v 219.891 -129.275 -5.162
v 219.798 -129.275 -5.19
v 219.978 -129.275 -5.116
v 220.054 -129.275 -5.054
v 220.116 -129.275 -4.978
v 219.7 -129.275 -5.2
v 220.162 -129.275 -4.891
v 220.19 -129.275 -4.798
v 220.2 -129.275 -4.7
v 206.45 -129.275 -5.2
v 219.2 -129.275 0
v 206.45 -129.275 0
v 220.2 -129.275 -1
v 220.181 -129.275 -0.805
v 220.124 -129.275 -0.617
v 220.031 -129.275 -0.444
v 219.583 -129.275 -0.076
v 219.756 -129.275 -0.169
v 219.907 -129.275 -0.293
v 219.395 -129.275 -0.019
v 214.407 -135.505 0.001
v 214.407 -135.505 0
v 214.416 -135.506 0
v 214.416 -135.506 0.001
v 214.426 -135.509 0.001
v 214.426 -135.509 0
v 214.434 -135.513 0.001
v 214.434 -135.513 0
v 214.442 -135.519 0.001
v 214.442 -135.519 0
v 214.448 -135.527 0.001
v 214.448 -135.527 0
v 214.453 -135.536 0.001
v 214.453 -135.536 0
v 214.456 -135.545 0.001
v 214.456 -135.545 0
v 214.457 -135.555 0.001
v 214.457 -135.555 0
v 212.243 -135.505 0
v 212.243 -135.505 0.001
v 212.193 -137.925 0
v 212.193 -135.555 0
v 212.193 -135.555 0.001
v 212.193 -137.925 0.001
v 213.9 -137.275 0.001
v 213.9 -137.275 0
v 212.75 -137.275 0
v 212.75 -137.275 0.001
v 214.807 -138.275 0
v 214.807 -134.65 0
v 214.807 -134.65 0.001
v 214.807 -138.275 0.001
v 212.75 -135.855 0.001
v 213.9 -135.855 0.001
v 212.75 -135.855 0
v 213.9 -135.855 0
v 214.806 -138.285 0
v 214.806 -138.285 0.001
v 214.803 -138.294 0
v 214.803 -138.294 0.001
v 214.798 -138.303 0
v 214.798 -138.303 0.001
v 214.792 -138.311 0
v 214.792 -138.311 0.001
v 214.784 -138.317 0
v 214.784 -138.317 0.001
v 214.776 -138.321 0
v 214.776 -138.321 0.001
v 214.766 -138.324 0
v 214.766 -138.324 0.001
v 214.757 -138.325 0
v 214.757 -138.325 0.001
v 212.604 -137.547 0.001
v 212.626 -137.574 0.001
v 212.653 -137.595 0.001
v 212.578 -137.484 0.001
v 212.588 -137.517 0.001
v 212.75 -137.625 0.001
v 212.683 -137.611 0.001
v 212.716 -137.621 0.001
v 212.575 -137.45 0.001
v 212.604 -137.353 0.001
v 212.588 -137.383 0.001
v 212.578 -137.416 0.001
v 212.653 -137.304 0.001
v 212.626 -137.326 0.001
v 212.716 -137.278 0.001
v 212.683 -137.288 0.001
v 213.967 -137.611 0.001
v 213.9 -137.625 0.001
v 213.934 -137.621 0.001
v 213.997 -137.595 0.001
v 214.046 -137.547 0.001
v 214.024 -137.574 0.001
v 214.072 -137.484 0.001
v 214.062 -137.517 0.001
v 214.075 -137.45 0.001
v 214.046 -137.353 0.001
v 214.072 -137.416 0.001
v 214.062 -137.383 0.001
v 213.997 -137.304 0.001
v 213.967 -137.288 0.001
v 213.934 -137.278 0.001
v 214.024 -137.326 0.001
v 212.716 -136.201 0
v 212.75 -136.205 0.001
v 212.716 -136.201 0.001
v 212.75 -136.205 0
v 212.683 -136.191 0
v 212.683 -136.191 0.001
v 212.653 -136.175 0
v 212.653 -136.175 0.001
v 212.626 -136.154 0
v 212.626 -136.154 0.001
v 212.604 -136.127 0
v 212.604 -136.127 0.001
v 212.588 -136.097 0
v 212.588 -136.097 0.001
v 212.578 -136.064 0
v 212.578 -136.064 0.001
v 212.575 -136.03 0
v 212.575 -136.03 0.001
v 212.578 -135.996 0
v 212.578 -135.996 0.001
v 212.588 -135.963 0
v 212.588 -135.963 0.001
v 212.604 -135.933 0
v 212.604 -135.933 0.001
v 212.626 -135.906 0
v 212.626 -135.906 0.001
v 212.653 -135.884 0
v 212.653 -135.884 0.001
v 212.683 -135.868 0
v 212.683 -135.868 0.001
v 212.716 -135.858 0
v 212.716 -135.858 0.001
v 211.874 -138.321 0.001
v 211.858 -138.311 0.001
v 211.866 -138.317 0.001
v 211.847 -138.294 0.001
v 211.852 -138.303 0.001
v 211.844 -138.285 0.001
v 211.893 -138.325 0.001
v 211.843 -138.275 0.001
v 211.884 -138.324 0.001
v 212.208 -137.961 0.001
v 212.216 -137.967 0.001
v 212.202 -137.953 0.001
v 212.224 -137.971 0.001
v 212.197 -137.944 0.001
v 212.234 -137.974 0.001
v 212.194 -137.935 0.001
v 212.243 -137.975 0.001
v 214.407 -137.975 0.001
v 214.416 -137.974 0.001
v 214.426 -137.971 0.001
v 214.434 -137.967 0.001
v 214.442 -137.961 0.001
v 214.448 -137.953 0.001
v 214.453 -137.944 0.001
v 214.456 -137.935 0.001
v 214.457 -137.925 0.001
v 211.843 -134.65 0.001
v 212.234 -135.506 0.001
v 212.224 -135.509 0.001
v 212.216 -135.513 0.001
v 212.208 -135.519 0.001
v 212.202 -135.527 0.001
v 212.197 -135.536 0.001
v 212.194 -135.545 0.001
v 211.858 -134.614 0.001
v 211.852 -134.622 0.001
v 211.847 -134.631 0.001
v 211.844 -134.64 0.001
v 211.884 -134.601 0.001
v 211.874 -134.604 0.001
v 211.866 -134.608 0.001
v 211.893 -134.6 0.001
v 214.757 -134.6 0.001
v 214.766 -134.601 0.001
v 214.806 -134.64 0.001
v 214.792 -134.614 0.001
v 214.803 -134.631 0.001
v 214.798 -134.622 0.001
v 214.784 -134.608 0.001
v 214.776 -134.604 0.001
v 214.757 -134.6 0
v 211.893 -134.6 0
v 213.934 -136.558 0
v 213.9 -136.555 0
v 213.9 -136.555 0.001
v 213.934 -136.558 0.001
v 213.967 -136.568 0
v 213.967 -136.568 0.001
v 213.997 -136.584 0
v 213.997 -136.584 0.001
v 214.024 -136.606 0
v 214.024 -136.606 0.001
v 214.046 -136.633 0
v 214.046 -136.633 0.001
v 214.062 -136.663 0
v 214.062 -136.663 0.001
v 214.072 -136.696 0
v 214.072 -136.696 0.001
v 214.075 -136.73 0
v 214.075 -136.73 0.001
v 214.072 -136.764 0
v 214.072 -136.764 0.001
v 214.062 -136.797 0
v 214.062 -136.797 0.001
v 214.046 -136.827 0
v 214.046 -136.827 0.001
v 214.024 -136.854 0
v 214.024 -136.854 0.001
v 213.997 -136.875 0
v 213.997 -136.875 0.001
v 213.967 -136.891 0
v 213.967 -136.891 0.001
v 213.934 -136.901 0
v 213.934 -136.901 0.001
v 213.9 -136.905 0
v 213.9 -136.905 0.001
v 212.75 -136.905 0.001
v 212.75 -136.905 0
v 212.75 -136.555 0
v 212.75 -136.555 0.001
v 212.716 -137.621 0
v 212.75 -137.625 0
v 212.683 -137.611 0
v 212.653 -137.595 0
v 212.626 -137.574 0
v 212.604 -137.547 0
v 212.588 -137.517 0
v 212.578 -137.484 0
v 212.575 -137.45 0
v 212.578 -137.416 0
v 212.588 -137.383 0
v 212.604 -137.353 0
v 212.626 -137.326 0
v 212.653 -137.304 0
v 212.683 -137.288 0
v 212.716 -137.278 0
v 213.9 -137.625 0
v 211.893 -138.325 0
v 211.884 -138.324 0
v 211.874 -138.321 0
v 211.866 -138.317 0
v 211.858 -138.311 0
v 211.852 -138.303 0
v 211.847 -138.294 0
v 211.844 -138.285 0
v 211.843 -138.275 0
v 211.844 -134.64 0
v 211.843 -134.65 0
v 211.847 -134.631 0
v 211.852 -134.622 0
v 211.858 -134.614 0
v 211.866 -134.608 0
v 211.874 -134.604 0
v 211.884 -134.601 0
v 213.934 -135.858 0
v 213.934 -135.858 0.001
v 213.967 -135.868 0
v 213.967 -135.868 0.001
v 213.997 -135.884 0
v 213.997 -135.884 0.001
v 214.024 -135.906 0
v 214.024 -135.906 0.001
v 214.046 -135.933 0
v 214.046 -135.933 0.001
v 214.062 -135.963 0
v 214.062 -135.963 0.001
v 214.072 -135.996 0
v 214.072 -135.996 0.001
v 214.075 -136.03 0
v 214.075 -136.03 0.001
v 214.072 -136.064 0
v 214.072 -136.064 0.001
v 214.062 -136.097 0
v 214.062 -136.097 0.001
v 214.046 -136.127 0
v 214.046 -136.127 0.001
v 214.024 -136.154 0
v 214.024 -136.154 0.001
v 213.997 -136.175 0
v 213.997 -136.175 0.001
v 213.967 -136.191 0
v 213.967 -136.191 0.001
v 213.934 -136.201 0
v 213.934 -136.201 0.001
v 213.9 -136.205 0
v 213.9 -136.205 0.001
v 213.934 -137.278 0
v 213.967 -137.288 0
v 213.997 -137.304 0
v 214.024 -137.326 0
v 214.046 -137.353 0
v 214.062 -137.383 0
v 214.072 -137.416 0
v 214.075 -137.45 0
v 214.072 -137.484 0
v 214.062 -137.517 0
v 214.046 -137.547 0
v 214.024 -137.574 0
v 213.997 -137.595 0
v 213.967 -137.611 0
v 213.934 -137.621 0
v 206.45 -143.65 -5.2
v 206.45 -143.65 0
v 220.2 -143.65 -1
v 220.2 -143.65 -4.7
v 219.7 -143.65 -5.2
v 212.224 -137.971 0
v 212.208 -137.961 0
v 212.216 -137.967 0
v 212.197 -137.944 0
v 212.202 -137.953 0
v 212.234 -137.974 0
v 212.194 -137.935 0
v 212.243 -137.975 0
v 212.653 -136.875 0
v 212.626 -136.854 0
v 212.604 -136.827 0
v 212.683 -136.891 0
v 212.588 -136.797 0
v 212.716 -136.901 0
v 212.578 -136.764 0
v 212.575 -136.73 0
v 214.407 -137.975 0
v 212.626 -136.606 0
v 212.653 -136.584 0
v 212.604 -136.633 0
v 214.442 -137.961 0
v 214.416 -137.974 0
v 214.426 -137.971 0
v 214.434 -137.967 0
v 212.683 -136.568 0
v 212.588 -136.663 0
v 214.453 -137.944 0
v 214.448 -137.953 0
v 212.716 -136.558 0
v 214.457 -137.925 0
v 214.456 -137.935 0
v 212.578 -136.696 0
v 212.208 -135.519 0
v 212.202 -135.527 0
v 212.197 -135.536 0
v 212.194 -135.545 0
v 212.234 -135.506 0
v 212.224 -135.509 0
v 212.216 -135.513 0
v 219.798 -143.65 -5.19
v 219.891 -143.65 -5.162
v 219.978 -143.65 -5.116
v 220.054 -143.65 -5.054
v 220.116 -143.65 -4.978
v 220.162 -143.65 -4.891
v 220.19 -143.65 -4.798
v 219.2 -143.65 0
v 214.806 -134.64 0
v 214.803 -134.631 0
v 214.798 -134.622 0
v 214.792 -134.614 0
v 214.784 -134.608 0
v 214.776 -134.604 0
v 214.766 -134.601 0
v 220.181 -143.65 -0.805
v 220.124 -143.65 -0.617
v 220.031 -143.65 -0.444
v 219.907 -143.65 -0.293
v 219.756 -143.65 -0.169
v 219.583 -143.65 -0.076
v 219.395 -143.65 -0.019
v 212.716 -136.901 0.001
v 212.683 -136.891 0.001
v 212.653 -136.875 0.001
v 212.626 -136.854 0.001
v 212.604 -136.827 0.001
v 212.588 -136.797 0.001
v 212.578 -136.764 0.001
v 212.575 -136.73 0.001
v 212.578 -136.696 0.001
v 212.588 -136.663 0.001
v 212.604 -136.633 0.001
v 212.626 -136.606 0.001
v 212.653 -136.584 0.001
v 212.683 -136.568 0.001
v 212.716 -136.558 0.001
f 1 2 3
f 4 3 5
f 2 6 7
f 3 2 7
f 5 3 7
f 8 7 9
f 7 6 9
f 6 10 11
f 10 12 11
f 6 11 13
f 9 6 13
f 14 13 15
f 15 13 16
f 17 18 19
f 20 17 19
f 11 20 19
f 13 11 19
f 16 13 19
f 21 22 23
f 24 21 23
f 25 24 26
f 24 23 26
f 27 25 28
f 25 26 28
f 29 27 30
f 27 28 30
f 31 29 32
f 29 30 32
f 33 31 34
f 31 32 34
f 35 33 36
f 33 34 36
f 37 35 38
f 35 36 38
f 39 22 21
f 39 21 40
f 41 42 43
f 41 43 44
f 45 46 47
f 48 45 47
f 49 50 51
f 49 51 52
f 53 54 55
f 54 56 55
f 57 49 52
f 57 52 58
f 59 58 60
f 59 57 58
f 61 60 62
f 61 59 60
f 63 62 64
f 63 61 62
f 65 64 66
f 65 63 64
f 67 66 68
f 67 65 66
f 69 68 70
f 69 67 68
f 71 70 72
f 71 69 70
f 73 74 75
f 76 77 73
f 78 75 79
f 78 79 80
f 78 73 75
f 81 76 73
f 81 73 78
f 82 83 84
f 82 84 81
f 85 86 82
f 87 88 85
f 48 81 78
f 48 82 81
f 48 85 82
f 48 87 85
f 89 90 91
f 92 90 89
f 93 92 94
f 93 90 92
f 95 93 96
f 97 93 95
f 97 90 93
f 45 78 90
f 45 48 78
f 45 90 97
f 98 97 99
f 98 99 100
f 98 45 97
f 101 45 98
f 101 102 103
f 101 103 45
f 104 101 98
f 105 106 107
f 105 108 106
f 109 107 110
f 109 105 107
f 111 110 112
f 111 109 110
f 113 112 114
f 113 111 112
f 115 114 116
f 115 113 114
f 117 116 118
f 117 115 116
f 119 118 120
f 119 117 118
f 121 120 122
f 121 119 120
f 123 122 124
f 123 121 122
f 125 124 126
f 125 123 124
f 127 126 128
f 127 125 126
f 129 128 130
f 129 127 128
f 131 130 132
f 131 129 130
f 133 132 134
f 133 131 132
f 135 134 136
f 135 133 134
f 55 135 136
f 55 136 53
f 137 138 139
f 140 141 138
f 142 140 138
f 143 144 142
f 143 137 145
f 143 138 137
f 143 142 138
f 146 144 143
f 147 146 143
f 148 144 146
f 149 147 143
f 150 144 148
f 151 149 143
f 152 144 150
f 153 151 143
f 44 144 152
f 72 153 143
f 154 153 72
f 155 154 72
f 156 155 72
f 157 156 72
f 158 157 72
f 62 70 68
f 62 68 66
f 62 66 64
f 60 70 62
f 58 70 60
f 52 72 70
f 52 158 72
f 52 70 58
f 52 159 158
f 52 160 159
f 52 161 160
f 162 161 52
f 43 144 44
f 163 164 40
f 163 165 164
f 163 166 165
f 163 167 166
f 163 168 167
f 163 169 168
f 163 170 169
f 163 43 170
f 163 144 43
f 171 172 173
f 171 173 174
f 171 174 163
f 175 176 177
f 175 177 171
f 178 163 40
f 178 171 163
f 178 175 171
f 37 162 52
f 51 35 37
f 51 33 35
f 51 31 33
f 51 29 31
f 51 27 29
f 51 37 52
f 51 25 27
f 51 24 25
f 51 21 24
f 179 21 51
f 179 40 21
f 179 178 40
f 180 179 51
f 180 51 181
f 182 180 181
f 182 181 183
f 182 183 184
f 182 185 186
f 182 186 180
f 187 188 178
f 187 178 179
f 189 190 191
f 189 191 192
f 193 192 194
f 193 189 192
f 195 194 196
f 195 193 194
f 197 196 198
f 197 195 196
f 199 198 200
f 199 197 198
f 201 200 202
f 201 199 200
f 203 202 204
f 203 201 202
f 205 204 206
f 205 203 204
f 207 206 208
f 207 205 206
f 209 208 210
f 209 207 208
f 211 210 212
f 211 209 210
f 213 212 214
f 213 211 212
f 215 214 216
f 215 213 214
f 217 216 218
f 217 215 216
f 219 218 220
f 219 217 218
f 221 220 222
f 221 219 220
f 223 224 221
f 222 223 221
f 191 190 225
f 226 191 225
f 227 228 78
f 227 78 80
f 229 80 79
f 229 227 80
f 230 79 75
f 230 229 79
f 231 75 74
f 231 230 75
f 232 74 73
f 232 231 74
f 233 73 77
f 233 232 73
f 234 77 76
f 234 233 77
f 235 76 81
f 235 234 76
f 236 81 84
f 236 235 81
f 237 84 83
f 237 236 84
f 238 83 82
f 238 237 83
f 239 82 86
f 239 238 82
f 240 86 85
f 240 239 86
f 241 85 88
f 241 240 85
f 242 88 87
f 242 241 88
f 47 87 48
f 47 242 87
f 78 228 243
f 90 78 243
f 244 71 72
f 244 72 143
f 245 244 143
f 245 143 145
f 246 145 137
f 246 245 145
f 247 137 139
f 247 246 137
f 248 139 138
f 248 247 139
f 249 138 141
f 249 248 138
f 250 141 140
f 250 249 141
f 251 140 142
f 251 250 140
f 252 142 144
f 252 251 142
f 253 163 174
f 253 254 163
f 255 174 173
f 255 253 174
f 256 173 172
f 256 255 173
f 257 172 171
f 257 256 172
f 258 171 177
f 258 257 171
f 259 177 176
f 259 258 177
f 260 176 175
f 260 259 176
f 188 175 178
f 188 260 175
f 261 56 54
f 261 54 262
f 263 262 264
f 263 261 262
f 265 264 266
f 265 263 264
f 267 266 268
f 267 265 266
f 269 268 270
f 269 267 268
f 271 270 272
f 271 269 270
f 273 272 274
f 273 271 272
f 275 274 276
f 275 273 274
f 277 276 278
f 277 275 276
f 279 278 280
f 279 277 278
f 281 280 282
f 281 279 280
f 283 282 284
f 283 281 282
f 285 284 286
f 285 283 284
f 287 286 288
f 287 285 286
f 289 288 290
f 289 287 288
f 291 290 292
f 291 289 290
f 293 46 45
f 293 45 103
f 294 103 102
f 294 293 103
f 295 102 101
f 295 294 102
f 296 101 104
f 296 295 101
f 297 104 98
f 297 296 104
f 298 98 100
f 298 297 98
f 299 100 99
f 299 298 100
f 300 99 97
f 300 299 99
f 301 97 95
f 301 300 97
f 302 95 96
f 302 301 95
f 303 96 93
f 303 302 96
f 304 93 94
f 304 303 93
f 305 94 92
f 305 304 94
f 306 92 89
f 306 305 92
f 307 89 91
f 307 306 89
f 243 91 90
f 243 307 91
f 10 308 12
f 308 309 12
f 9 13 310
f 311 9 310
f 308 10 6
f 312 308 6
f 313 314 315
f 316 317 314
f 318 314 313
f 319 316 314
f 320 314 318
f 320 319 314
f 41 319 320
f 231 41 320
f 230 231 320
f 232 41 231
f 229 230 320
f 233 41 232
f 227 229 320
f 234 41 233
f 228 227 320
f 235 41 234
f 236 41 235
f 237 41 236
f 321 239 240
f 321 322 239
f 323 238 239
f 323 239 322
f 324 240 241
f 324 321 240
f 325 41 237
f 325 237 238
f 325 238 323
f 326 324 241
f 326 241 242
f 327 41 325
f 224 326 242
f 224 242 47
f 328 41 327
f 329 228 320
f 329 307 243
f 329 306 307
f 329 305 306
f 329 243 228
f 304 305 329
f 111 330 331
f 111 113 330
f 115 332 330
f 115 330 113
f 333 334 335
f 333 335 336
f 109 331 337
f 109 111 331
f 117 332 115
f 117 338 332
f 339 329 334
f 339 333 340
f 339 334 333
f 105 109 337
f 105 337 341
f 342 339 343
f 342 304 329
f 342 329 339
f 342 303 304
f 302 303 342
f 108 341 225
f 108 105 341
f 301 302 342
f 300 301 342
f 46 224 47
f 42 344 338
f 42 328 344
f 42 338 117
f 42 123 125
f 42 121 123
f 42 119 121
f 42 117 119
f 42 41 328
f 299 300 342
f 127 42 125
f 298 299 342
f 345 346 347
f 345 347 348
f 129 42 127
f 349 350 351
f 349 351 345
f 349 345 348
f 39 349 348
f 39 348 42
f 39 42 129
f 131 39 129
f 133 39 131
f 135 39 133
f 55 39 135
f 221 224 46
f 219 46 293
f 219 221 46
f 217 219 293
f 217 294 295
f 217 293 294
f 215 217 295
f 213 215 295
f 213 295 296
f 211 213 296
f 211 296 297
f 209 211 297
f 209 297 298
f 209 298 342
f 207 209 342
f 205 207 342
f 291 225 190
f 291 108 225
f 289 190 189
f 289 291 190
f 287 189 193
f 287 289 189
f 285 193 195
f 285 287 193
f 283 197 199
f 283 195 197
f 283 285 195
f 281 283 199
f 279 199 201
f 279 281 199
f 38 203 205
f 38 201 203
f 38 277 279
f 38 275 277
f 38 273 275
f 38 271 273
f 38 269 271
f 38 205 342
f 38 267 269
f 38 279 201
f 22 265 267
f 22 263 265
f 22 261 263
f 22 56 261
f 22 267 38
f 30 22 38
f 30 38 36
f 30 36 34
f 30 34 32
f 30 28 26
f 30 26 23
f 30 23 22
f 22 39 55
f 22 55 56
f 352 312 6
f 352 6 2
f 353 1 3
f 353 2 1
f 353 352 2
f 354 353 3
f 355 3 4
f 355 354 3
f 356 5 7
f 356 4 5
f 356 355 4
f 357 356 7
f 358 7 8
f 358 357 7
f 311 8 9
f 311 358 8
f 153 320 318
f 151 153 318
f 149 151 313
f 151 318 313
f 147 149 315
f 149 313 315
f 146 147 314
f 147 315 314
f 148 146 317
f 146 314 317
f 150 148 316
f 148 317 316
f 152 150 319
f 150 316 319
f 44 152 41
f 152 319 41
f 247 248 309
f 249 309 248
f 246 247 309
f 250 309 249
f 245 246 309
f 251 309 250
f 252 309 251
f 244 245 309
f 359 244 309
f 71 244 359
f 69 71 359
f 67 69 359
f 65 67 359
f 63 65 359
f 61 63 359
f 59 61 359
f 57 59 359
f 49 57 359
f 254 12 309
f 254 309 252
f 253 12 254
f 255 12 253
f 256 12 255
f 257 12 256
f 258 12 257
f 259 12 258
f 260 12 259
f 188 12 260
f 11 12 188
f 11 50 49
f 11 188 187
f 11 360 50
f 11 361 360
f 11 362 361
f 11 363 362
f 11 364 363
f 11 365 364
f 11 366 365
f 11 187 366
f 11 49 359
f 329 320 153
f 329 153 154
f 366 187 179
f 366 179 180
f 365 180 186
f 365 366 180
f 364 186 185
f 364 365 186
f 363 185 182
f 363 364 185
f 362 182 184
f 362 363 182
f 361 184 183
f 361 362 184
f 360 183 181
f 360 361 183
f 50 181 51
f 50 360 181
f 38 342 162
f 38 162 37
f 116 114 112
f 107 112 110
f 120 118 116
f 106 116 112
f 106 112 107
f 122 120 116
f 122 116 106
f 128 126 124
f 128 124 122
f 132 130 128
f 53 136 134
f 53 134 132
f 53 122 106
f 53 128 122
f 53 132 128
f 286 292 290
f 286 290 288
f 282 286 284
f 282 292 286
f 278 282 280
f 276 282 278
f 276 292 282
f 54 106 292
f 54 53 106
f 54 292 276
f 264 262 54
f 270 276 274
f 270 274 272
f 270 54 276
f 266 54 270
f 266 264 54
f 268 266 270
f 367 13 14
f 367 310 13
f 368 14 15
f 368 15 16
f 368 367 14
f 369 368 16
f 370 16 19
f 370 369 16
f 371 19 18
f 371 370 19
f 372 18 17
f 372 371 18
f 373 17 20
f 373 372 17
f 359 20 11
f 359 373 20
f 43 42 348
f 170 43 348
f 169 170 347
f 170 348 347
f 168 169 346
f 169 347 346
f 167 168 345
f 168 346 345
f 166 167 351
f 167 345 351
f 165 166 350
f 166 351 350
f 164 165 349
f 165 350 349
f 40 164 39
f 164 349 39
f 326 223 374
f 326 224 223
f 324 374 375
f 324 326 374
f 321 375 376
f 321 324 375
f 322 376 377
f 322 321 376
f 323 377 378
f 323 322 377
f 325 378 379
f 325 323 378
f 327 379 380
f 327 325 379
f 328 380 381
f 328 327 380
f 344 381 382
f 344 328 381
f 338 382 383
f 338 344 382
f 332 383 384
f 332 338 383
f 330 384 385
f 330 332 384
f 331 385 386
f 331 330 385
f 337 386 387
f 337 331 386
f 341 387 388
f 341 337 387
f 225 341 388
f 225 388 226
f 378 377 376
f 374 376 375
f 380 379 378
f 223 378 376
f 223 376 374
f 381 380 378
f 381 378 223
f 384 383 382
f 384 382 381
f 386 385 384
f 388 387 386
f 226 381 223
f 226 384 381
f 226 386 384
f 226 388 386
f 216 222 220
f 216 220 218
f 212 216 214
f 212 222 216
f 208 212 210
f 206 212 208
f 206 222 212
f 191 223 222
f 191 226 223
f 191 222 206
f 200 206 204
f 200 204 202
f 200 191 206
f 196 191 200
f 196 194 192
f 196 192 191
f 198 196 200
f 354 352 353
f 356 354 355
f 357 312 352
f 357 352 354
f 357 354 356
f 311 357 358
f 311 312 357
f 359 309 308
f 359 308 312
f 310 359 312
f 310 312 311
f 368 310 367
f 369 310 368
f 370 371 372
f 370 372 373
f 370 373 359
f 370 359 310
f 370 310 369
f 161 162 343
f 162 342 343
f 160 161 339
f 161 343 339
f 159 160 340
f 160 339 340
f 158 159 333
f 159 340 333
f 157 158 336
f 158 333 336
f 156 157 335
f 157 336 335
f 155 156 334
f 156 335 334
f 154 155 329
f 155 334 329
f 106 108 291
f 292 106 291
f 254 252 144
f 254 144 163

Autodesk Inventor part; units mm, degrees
ref_plane "YZ Plane" through (0, 0, 0) normal (1, 0, 0) x (0, 1, 0)
ref_plane "XZ Plane" through (0, 0, 0) normal (0, 1, 0) x (-1, 0, 0)
ref_plane "XY Plane" through (0, 0, 0) normal (0, 0, 1) x (1, 0, 0)
sketch "Szkic1" plane through (0, 0, 0) normal (0, 0, 1) x (1, 0, 0)
  line L0 (206.45, -143.65) -> (206.45, -129.275)
  line L1 (206.45, -129.275) -> (220.2, -129.275)
  line L2 (206.45, -143.65) -> (220.2, -143.65)
  line L3 (220.2, -129.275) -> (220.2, -143.65)
extrude "Wyciągnięcie proste1" add sketch "Szkic1" against normal blind 5.2
fillet "Zaokrąglenie1" radius 0.5 1 edges at (220.2, -136.4625, -5.2)
fillet "Zaokrąglenie2" radius 1 1 edges at (220.2, -136.4625, 0)
sketch "Szkic6" plane through (0, 0, 0) normal (0, 0, 1) x (1, 0, 0)
  line L0 (211.8933, -134.5998) -> (214.7567, -134.5998)
  line L1 (214.8067, -134.6498) -> (214.8067, -138.2752)
  line L2 (214.7567, -138.3252) -> (211.8933, -138.3252)
  line L3 (211.8433, -138.2752) -> (211.8433, -134.6498)
  line L4 (212.2433, -137.9752) -> (214.4067, -137.9752)
  line L5 (214.4567, -137.9252) -> (214.4567, -135.5548)
  line L6 (212.1933, -135.5548) -> (212.1933, -137.9252)
  line L7 (214.4067, -135.5048) -> (212.2433, -135.5048)
  line L8 (212.75, -137.6248) -> (213.9, -137.6248)
  line L9 (213.9, -137.2748) -> (212.75, -137.2748)
  arc A0 (212.75, -137.2748) -> (212.75, -137.6248) centre (212.75, -137.4498) ccw
  arc A1 (213.9, -137.6248) -> (213.9, -137.2748) centre (213.9, -137.4498) ccw
  line L10 (212.75, -136.9048) -> (213.9, -136.9048)
  line L11 (213.9, -136.5548) -> (212.75, -136.5548)
  arc A2 (212.75, -136.5548) -> (212.75, -136.9048) centre (212.75, -136.7298) ccw
  arc A3 (213.9, -136.9048) -> (213.9, -136.5548) centre (213.9, -136.7298) ccw
  line L12 (212.75, -136.2048) -> (213.9, -136.2048)
  line L13 (213.9, -135.8548) -> (212.75, -135.8548)
  arc A4 (212.75, -135.8548) -> (212.75, -136.2048) centre (212.75, -136.0298) ccw
  arc A5 (213.9, -136.2048) -> (213.9, -135.8548) centre (213.9, -136.0298) ccw
  arc A6 (214.8067, -134.6498) -> (214.7567, -134.5998) centre (214.7567, -134.6498) ccw
  arc A7 (214.7567, -138.3252) -> (214.8067, -138.2752) centre (214.7567, -138.2752) ccw
  arc A8 (211.8933, -134.5998) -> (211.8433, -134.6498) centre (211.8933, -134.6498) ccw
  arc A9 (211.8433, -138.2752) -> (211.8933, -138.3252) centre (211.8933, -138.2752) ccw
  arc A10 (212.1933, -137.9252) -> (212.2433, -137.9752) centre (212.2433, -137.9252) ccw
  arc A11 (212.2433, -135.5048) -> (212.1933, -135.5548) centre (212.2433, -135.5548) ccw
  arc A12 (214.4567, -135.5548) -> (214.4067, -135.5048) centre (214.4067, -135.5548) ccw
  arc A13 (214.4067, -137.9752) -> (214.4567, -137.9252) centre (214.4067, -137.9252) ccw
  point P0 (213.325, -137.4498)
  point P1 (213.325, -136.7298)
  point P2 (213.325, -137.4498)
  point P3 (213.325, -136.7298)
  point P4 (213.325, -136.0298)
  dimension "d80" = 0.175
extrude "Wyciągnięcie proste5" add sketch "Szkic6" along normal blind 0.001
properties part number "PRZYCISK IO" material "Tworzywo sztuczne, nieprzezroczyste czarne"
